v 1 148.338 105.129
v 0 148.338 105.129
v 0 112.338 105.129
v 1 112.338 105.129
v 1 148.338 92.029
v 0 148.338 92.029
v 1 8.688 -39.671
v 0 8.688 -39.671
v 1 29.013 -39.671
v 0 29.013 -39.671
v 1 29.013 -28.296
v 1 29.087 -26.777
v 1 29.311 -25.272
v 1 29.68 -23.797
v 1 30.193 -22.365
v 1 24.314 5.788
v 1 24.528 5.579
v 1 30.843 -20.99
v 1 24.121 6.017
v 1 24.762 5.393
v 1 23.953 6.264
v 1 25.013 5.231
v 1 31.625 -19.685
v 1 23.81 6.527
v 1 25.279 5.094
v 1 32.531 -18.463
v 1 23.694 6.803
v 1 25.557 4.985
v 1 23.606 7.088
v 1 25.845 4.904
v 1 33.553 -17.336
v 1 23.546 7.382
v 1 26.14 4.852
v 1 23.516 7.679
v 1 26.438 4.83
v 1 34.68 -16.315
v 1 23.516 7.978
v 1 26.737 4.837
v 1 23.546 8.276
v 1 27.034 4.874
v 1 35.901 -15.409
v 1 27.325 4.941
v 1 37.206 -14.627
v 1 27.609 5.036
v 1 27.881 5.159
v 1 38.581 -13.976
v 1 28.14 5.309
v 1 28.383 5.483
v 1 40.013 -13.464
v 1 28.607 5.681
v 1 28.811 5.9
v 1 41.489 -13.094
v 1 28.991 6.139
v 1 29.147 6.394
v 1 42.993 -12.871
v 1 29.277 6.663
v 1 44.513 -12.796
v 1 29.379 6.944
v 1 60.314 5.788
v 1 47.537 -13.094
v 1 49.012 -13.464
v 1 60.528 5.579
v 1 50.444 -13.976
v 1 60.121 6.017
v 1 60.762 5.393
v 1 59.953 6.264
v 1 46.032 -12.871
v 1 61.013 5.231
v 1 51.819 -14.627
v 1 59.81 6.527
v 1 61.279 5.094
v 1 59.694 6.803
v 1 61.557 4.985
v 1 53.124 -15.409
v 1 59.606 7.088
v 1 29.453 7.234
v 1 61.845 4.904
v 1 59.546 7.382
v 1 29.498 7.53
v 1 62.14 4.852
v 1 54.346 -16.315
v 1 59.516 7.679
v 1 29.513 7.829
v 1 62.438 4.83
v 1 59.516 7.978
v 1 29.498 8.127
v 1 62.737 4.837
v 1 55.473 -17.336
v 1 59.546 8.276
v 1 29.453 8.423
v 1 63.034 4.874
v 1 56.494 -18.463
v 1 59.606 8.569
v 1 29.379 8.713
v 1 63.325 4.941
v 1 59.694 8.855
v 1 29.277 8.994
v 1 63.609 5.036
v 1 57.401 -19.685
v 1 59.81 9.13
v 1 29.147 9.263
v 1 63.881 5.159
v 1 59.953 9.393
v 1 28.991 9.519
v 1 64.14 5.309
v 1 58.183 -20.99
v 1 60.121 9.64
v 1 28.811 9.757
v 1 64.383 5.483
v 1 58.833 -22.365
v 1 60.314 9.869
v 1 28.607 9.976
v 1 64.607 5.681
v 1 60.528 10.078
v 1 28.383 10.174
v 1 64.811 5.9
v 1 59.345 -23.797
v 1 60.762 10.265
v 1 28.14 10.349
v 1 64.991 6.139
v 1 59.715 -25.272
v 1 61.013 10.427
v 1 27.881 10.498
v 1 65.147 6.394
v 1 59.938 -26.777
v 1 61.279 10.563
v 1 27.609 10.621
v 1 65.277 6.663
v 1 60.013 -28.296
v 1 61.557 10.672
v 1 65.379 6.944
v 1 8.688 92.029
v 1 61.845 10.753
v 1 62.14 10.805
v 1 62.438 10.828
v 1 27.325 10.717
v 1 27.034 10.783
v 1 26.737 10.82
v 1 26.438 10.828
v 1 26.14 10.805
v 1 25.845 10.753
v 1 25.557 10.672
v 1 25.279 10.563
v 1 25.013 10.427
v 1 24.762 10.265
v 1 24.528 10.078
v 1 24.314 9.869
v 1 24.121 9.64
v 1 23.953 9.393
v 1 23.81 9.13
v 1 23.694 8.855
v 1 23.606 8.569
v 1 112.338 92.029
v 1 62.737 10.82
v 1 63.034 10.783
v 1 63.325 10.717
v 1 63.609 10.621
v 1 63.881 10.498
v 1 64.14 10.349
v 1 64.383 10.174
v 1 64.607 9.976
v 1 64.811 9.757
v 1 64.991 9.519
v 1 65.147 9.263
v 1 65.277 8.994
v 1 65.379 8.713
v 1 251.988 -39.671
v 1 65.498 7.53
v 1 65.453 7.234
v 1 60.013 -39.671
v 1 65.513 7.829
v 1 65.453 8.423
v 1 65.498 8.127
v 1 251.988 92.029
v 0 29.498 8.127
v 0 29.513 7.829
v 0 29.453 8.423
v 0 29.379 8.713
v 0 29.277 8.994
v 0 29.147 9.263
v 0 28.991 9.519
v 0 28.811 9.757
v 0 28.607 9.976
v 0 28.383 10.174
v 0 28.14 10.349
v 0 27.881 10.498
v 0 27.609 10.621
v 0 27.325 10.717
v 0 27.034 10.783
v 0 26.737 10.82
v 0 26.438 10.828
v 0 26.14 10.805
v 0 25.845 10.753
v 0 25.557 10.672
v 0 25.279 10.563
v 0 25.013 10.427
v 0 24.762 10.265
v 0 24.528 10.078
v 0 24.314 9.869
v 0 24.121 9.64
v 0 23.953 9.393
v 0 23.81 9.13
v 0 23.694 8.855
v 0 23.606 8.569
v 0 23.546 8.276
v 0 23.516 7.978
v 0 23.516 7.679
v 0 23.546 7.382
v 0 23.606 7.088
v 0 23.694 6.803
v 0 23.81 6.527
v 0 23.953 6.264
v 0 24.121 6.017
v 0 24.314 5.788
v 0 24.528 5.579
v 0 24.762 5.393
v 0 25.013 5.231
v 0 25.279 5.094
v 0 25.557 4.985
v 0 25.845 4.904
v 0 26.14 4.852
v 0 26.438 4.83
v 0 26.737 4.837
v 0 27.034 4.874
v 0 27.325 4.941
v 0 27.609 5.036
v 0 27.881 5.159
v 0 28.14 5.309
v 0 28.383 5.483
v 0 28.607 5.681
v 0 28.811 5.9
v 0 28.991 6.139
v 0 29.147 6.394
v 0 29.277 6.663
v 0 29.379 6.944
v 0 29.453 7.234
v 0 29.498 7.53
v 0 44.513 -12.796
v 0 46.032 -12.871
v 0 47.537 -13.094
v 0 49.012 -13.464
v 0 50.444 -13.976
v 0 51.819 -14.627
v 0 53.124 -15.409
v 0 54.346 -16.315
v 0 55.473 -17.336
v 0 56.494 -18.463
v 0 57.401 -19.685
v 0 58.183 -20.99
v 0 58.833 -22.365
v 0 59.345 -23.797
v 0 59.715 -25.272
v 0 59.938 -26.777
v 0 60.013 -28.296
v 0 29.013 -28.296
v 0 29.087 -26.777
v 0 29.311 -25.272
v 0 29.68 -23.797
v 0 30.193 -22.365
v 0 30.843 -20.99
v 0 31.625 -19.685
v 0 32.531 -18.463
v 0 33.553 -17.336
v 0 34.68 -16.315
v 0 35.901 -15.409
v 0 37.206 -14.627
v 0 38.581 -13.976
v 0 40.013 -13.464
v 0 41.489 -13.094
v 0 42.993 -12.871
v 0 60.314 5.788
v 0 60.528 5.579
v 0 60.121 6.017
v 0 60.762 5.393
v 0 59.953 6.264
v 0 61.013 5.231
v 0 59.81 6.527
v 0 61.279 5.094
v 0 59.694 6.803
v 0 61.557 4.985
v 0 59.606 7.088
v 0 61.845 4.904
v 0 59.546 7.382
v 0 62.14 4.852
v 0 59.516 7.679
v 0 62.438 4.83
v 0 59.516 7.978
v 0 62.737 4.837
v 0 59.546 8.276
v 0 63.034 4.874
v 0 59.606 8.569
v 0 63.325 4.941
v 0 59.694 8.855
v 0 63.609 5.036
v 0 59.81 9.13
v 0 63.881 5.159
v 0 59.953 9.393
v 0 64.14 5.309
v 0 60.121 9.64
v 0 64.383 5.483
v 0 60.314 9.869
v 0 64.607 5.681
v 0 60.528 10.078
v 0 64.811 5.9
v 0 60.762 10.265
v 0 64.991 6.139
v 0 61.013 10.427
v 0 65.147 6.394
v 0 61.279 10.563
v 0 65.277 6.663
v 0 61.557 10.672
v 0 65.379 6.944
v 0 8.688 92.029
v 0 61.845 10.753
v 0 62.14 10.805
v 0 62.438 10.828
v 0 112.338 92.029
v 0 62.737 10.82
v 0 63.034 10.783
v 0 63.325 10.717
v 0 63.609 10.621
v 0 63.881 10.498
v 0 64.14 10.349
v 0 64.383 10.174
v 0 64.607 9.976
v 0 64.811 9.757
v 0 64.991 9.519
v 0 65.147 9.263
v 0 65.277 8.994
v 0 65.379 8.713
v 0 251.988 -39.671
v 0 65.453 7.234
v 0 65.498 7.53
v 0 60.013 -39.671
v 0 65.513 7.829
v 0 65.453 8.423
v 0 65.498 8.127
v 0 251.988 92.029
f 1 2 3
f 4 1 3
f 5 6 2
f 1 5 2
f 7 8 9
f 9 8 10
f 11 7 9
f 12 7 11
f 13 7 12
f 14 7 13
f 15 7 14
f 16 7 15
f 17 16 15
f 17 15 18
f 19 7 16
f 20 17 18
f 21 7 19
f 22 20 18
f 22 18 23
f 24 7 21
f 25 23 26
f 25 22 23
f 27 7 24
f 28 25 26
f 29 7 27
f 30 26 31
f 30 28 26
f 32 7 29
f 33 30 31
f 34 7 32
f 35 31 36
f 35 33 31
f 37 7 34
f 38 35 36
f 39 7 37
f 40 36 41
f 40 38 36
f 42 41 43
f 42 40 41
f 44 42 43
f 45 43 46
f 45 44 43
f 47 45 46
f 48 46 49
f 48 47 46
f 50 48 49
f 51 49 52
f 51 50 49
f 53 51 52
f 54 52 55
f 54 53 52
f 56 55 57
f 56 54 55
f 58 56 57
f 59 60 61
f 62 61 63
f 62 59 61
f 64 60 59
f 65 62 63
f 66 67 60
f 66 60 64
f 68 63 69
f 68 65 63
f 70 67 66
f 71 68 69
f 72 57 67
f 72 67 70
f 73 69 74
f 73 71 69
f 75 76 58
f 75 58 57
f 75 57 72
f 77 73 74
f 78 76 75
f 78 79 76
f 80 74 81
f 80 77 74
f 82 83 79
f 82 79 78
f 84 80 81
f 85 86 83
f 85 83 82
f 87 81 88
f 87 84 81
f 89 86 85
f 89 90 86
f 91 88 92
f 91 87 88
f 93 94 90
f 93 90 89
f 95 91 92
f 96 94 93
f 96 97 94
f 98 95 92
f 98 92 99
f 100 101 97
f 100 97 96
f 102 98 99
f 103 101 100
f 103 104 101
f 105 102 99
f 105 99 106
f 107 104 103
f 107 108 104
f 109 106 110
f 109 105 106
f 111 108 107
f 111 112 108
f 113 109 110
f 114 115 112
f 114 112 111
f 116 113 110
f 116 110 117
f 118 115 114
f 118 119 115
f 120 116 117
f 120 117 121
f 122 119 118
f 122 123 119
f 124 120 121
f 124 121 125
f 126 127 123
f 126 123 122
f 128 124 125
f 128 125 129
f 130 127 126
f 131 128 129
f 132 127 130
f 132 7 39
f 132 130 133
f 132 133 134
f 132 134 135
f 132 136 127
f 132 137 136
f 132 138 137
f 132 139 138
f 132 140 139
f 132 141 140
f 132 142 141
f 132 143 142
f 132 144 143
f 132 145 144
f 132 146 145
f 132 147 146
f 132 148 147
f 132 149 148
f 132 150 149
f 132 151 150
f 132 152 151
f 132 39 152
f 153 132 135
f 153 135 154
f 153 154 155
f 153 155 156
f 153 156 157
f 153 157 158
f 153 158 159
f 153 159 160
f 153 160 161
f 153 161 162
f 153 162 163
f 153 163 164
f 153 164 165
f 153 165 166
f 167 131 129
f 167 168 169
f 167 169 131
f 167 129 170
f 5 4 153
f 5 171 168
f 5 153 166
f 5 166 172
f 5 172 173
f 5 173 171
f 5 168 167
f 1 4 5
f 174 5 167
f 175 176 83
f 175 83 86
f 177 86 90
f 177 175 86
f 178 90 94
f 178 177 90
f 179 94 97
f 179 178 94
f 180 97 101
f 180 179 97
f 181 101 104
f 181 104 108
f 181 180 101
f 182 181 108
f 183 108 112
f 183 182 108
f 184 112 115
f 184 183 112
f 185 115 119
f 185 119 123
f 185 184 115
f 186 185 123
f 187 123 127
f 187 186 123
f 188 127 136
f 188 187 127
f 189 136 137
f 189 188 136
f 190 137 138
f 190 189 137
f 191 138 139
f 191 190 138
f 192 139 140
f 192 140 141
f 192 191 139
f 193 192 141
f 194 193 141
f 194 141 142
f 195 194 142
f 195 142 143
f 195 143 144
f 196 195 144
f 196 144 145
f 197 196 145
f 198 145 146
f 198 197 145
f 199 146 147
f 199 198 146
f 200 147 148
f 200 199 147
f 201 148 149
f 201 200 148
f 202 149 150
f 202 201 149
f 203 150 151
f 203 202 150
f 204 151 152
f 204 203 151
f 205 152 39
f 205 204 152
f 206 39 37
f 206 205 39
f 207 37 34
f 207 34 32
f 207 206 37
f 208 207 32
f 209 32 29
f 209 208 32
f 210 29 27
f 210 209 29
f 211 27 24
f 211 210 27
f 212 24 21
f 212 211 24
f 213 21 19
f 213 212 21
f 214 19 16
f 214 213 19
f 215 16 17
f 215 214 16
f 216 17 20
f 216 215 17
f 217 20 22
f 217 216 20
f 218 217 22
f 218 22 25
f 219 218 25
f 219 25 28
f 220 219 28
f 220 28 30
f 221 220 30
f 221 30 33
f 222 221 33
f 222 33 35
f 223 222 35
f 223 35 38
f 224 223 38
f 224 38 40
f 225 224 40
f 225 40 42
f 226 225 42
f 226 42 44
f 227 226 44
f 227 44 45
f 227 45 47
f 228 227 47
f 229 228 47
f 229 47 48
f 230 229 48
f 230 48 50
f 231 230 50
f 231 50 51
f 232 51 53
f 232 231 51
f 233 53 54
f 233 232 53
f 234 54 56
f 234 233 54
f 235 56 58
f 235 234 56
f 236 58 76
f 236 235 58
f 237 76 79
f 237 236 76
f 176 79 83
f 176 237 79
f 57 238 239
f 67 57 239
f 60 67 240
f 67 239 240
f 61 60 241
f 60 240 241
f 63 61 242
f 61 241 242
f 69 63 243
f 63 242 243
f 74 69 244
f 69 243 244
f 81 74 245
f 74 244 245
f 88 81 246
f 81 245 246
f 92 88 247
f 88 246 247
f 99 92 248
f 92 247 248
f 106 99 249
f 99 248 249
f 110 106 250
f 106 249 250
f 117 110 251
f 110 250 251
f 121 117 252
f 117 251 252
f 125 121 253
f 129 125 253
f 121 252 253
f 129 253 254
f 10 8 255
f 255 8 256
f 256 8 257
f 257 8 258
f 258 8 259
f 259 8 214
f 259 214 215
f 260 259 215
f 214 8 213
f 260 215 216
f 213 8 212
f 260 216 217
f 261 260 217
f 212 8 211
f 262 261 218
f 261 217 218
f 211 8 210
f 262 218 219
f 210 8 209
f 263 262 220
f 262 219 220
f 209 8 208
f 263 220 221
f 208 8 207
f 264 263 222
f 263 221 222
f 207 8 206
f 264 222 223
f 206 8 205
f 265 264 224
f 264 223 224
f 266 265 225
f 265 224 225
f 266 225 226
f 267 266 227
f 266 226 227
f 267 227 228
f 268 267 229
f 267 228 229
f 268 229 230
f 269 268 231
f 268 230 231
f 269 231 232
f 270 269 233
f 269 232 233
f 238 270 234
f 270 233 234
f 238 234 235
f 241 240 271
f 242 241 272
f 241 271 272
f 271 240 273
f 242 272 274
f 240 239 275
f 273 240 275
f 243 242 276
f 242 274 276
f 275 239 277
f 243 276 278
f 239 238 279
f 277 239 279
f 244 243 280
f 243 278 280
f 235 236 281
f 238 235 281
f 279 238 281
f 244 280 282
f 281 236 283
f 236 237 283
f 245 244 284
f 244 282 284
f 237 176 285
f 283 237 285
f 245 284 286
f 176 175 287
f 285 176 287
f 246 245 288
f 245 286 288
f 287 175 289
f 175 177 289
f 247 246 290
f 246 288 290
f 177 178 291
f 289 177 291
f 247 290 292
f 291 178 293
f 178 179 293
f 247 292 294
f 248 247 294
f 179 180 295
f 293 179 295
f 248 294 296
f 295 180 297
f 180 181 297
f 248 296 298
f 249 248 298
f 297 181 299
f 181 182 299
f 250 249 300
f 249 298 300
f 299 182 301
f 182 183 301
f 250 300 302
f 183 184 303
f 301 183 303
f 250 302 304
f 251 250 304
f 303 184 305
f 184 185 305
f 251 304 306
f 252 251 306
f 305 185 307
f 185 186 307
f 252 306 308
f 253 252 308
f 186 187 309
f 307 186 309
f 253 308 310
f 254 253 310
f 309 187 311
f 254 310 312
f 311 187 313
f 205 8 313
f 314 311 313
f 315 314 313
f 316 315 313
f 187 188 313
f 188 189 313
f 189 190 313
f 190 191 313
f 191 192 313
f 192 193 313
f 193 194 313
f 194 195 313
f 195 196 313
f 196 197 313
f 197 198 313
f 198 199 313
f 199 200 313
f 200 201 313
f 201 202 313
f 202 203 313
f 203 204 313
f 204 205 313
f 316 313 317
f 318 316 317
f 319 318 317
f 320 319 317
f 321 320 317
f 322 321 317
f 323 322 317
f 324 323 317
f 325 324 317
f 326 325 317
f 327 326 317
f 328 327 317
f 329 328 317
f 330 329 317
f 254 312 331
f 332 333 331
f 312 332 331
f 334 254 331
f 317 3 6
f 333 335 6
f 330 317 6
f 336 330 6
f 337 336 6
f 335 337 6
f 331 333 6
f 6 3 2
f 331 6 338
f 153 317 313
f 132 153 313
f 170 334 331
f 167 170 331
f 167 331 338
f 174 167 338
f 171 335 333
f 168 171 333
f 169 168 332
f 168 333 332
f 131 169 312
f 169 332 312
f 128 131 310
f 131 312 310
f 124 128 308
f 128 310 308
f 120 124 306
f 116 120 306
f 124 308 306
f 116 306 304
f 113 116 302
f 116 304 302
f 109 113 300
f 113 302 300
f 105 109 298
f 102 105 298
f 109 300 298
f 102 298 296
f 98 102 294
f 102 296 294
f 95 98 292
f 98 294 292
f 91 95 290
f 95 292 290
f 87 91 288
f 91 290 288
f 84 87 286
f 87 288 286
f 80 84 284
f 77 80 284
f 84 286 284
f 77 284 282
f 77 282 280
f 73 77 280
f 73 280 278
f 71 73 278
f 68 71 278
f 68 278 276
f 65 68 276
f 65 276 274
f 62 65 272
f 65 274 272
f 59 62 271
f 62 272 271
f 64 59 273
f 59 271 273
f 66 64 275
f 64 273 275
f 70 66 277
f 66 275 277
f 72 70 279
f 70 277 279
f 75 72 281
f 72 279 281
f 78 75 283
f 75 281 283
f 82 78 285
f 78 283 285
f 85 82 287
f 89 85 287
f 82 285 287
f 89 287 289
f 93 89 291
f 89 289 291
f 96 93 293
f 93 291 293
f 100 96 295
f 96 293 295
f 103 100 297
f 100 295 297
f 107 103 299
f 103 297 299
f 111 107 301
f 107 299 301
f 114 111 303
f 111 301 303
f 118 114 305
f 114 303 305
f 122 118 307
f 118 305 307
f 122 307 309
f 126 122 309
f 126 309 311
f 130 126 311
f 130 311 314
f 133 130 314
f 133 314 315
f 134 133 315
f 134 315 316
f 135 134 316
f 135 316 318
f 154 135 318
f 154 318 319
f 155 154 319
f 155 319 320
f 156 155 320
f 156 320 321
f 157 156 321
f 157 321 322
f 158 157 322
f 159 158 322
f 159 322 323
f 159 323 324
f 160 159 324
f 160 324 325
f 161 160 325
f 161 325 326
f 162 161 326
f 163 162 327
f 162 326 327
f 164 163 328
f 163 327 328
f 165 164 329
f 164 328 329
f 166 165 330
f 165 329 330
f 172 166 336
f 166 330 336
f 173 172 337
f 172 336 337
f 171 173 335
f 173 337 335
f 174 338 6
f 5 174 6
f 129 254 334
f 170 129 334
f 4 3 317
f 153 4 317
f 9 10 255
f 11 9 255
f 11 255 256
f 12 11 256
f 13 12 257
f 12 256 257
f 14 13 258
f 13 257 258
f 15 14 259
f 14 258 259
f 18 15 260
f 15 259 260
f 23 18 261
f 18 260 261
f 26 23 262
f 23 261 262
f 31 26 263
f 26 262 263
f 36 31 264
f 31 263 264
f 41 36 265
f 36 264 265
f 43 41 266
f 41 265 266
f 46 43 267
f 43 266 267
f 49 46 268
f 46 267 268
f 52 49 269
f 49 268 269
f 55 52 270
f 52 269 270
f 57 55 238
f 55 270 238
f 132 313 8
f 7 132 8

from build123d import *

# Parameters (mm, degrees)
F0_W     = 28.35
F0_H     = 108.95
F0_W_2   = 6
F0_H_2   = 28
F0_W_3   = 4
F0_H_3   = 32.75
F0_H_4   = 9.8
F0_H_5   = 24
F0_W_4   = 9.65
F0_H_6   = 76.2
F0_H_7   = 11.1
F0_R     = 3
F1_DEPTH = 1


# Not quite as in the source:
# - a feature names something its author has since deleted; it is built from what else it names


with BuildPart() as f1:
    # F0 (on Right) → F1 (new body)
    with BuildSketch(Plane.YZ):
        Polygon((178.337747033, -16.9212994559), (149.987747033, -16.9212994559), (130.337747033, -16.9212994559), (130.337747033, -39.6712994559), (251.987747033, -39.6712994559), (251.987747033, -16.9212994559), (182.337747033, -16.9212994559), align=None)
        with Locations((164.162747033, 37.5537005441)):
            Rectangle(F0_W, F0_H)
        Polygon((130.337747033, -16.9212994559), (149.987747033, -16.9212994559), (149.987747033, 92.0287005441), (148.337747033, 92.0287005441), (136.337747033, 92.0287005441), (136.337747033, 68.0287005441), (136.337747033, 56.9287005441), (136.337747033, 28.9287005441), (136.337747033, 19.1287005441), (136.337747033, -8.8712994559), (130.337747033, -8.8712994559), align=None)
        Polygon((130.337747033, -39.6712994559), (130.337747033, -16.9212994559), (110.687747033, -16.9212994559), (82.337747033, -16.9212994559), (82.337747033, -28.2962994559), (82.337747033, -39.6712994559), align=None)
        Polygon((110.687747033, -16.9212994559), (130.337747033, -16.9212994559), (130.337747033, -8.8712994559), (124.337747033, -8.8712994559), (124.337747033, 19.1287005441), (124.337747033, 21.9287005441), (124.337747033, 24.7287005441), (124.337747033, 27.5287005441), (124.337747033, 28.9287005441), (124.337747033, 56.9287005441), (130.337747033, 56.9287005441), (130.337747033, 68.0287005441), (124.337747033, 68.0287005441), (124.337747033, 92.0287005441), (130.337747033, 92.0287005441), (136.337747033, 92.0287005441), (148.337747033, 92.0287005441), (148.337747033, 102.1287005441), (148.337747033, 105.1287005441), (143.337747033, 105.1287005441), (130.337747033, 105.1287005441), (112.337747033, 105.1287005441), (112.337747033, 102.1287005441), (112.337747033, 92.0287005441), (110.687747033, 92.0287005441), align=None)
        Polygon((178.337747033, 92.0287005441), (178.337747033, -16.9212994559), (182.337747033, -16.9212994559), (182.337747033, 92.0287005441), (179.8798441887, 92.0287005441), align=None)
        Polygon((82.337747033, -16.9212994559), (110.687747033, -16.9212994559), (110.687747033, 92.0287005441), (82.337747033, 92.0287005441), (82.337747033, 15.8287005441), align=None)
        with Locations((133.337747033, 5.1287005441)):
            Rectangle(F0_W_2, F0_H_2)
        with Locations((127.337747033, 5.1287005441)):
            Rectangle(F0_W_2, F0_H_2)
        Polygon((182.337747033, 92.0287005441), (182.337747033, -16.9212994559), (251.987747033, -16.9212994559), (251.987747033, 92.0287005441), (226.687747033, 92.0287005441), (216.162747033, 92.0287005441), (214.687747033, 92.0287005441), align=None)
        Polygon((82.337747033, -28.2962994559), (82.337747033, -16.9212994559), (78.337747033, -16.9212994559), (68.687747033, -16.9212994559), (68.687747033, -28.2962994559), align=None)
        with Locations((80.337747033, -0.5462994559)):
            Rectangle(F0_W_3, F0_H_3)
        with Locations((133.337747033, 24.0287005441)):
            Rectangle(F0_W_2, F0_H_4)
        Polygon((124.337747033, 19.1287005441), (130.337747033, 19.1287005441), (130.337747033, 28.9287005441), (124.337747033, 28.9287005441), (124.337747033, 27.5287005441), (124.337747033, 24.7287005441), (124.337747033, 21.9287005441), align=None)
        Polygon((60.012747033, -39.6712994559), (82.337747033, -39.6712994559), (82.337747033, -28.2962994559), (68.687747033, -28.2962994559), (63.512747033, -28.2962994559), (60.012747033, -28.2962994559), align=None)
        with Locations((133.337747033, 80.0287005441)):
            Rectangle(F0_W_2, F0_H_5)
        with Locations((73.512747033, -0.5462994559)):
            Rectangle(F0_W_4, F0_H_3)
        with Locations((80.337747033, 53.9287005441)):
            Rectangle(F0_W_3, F0_H_6)
        with Locations((133.337747033, 42.9287005441)):
            Rectangle(F0_W_2, F0_H_2)
        with Locations((127.337747033, 42.9287005441)):
            Rectangle(F0_W_2, F0_H_2)
        with Locations((127.337747033, 80.0287005441)):
            Rectangle(F0_W_2, F0_H_5)
        with Locations((133.337747033, 62.4787005441)):
            Rectangle(F0_W_2, F0_H_7)
        with BuildLine():
            Line((68.687747033, -28.2962994559), (68.687747033, -16.9212994559))
            Line((68.687747033, -16.9212994559), (68.687747033, 15.8287005441))
            Line((68.687747033, 15.8287005441), (54.687747033, 15.8287005441))
            Line((54.687747033, 15.8287005441), (44.512747033, 15.8287005441))
            Line((44.512747033, 15.8287005441), (37.687747033, 15.8287005441))
            Line((37.687747033, 15.8287005441), (8.687747033, 15.8287005441))
            Line((8.687747033, 15.8287005441), (8.687747033, -28.2962994559))
            Line((8.687747033, -28.2962994559), (25.512747033, -28.2962994559))
            ThreePointArc((25.512747033, -28.2962994559), (31.0777181904, -14.8612706134), (44.512747033, -9.2962994559))
            ThreePointArc((44.512747033, -9.2962994559), (57.9477758755, -14.8612706134), (63.512747033, -28.2962994559))
            Line((63.512747033, -28.2962994559), (68.687747033, -28.2962994559))
        make_face()
        with Locations((26.512747033, 7.8287005441)):
            Circle(F0_R, mode=Mode.SUBTRACT)
        with BuildLine():
            ThreePointArc((59.512747033, 7.8287005441), (62.512747033, 10.8287005441), (65.512747033, 7.8287005441))
            ThreePointArc((65.512747033, 7.8287005441), (62.512747033, 4.8287005441), (59.512747033, 7.8287005441))
        make_face(mode=Mode.SUBTRACT)
        Polygon((68.687747033, 15.8287005441), (78.337747033, 15.8287005441), (78.337747033, 92.0287005441), (37.687747033, 92.0287005441), (8.687747033, 92.0287005441), (8.687747033, 32.6287005441), (33.187747033, 32.6287005441), (37.687747033, 32.6287005441), (37.687747033, 15.8287005441), (44.512747033, 15.8287005441), (54.687747033, 15.8287005441), align=None)
        with BuildLine():
            ThreePointArc((44.512747033, -12.7962994559), (55.4729021414, -17.3361443475), (60.012747033, -28.2962994559))
            Line((60.012747033, -28.2962994559), (63.512747033, -28.2962994559))
            ThreePointArc((63.512747033, -28.2962994559), (57.9477758755, -14.8612706134), (44.512747033, -9.2962994559))
            Line((44.512747033, -9.2962994559), (44.512747033, -12.7962994559))
        make_face()
        with BuildLine():
            ThreePointArc((29.012747033, -28.2962994559), (33.5525919246, -17.3361443475), (44.512747033, -12.7962994559))
            Line((44.512747033, -12.7962994559), (44.512747033, -9.2962994559))
            ThreePointArc((44.512747033, -9.2962994559), (31.0777181904, -14.8612706134), (25.512747033, -28.2962994559))
            Line((25.512747033, -28.2962994559), (28.8426652551, -28.2962994559))
            Line((28.8426652551, -28.2962994559), (29.012747033, -28.2962994559))
        make_face()
        Polygon((29.012747033, -39.6712994559), (29.012747033, -28.2962994559), (28.8426652551, -28.2962994559), (25.512747033, -28.2962994559), (8.687747033, -28.2962994559), (8.687747033, -39.6712994559), align=None)
        Polygon((33.187747033, 32.6287005441), (8.687747033, 32.6287005441), (8.687747033, 15.8287005441), (37.687747033, 15.8287005441), (37.687747033, 32.6287005441), align=None)
    extrude(amount=F1_DEPTH)


solid = f1.part
